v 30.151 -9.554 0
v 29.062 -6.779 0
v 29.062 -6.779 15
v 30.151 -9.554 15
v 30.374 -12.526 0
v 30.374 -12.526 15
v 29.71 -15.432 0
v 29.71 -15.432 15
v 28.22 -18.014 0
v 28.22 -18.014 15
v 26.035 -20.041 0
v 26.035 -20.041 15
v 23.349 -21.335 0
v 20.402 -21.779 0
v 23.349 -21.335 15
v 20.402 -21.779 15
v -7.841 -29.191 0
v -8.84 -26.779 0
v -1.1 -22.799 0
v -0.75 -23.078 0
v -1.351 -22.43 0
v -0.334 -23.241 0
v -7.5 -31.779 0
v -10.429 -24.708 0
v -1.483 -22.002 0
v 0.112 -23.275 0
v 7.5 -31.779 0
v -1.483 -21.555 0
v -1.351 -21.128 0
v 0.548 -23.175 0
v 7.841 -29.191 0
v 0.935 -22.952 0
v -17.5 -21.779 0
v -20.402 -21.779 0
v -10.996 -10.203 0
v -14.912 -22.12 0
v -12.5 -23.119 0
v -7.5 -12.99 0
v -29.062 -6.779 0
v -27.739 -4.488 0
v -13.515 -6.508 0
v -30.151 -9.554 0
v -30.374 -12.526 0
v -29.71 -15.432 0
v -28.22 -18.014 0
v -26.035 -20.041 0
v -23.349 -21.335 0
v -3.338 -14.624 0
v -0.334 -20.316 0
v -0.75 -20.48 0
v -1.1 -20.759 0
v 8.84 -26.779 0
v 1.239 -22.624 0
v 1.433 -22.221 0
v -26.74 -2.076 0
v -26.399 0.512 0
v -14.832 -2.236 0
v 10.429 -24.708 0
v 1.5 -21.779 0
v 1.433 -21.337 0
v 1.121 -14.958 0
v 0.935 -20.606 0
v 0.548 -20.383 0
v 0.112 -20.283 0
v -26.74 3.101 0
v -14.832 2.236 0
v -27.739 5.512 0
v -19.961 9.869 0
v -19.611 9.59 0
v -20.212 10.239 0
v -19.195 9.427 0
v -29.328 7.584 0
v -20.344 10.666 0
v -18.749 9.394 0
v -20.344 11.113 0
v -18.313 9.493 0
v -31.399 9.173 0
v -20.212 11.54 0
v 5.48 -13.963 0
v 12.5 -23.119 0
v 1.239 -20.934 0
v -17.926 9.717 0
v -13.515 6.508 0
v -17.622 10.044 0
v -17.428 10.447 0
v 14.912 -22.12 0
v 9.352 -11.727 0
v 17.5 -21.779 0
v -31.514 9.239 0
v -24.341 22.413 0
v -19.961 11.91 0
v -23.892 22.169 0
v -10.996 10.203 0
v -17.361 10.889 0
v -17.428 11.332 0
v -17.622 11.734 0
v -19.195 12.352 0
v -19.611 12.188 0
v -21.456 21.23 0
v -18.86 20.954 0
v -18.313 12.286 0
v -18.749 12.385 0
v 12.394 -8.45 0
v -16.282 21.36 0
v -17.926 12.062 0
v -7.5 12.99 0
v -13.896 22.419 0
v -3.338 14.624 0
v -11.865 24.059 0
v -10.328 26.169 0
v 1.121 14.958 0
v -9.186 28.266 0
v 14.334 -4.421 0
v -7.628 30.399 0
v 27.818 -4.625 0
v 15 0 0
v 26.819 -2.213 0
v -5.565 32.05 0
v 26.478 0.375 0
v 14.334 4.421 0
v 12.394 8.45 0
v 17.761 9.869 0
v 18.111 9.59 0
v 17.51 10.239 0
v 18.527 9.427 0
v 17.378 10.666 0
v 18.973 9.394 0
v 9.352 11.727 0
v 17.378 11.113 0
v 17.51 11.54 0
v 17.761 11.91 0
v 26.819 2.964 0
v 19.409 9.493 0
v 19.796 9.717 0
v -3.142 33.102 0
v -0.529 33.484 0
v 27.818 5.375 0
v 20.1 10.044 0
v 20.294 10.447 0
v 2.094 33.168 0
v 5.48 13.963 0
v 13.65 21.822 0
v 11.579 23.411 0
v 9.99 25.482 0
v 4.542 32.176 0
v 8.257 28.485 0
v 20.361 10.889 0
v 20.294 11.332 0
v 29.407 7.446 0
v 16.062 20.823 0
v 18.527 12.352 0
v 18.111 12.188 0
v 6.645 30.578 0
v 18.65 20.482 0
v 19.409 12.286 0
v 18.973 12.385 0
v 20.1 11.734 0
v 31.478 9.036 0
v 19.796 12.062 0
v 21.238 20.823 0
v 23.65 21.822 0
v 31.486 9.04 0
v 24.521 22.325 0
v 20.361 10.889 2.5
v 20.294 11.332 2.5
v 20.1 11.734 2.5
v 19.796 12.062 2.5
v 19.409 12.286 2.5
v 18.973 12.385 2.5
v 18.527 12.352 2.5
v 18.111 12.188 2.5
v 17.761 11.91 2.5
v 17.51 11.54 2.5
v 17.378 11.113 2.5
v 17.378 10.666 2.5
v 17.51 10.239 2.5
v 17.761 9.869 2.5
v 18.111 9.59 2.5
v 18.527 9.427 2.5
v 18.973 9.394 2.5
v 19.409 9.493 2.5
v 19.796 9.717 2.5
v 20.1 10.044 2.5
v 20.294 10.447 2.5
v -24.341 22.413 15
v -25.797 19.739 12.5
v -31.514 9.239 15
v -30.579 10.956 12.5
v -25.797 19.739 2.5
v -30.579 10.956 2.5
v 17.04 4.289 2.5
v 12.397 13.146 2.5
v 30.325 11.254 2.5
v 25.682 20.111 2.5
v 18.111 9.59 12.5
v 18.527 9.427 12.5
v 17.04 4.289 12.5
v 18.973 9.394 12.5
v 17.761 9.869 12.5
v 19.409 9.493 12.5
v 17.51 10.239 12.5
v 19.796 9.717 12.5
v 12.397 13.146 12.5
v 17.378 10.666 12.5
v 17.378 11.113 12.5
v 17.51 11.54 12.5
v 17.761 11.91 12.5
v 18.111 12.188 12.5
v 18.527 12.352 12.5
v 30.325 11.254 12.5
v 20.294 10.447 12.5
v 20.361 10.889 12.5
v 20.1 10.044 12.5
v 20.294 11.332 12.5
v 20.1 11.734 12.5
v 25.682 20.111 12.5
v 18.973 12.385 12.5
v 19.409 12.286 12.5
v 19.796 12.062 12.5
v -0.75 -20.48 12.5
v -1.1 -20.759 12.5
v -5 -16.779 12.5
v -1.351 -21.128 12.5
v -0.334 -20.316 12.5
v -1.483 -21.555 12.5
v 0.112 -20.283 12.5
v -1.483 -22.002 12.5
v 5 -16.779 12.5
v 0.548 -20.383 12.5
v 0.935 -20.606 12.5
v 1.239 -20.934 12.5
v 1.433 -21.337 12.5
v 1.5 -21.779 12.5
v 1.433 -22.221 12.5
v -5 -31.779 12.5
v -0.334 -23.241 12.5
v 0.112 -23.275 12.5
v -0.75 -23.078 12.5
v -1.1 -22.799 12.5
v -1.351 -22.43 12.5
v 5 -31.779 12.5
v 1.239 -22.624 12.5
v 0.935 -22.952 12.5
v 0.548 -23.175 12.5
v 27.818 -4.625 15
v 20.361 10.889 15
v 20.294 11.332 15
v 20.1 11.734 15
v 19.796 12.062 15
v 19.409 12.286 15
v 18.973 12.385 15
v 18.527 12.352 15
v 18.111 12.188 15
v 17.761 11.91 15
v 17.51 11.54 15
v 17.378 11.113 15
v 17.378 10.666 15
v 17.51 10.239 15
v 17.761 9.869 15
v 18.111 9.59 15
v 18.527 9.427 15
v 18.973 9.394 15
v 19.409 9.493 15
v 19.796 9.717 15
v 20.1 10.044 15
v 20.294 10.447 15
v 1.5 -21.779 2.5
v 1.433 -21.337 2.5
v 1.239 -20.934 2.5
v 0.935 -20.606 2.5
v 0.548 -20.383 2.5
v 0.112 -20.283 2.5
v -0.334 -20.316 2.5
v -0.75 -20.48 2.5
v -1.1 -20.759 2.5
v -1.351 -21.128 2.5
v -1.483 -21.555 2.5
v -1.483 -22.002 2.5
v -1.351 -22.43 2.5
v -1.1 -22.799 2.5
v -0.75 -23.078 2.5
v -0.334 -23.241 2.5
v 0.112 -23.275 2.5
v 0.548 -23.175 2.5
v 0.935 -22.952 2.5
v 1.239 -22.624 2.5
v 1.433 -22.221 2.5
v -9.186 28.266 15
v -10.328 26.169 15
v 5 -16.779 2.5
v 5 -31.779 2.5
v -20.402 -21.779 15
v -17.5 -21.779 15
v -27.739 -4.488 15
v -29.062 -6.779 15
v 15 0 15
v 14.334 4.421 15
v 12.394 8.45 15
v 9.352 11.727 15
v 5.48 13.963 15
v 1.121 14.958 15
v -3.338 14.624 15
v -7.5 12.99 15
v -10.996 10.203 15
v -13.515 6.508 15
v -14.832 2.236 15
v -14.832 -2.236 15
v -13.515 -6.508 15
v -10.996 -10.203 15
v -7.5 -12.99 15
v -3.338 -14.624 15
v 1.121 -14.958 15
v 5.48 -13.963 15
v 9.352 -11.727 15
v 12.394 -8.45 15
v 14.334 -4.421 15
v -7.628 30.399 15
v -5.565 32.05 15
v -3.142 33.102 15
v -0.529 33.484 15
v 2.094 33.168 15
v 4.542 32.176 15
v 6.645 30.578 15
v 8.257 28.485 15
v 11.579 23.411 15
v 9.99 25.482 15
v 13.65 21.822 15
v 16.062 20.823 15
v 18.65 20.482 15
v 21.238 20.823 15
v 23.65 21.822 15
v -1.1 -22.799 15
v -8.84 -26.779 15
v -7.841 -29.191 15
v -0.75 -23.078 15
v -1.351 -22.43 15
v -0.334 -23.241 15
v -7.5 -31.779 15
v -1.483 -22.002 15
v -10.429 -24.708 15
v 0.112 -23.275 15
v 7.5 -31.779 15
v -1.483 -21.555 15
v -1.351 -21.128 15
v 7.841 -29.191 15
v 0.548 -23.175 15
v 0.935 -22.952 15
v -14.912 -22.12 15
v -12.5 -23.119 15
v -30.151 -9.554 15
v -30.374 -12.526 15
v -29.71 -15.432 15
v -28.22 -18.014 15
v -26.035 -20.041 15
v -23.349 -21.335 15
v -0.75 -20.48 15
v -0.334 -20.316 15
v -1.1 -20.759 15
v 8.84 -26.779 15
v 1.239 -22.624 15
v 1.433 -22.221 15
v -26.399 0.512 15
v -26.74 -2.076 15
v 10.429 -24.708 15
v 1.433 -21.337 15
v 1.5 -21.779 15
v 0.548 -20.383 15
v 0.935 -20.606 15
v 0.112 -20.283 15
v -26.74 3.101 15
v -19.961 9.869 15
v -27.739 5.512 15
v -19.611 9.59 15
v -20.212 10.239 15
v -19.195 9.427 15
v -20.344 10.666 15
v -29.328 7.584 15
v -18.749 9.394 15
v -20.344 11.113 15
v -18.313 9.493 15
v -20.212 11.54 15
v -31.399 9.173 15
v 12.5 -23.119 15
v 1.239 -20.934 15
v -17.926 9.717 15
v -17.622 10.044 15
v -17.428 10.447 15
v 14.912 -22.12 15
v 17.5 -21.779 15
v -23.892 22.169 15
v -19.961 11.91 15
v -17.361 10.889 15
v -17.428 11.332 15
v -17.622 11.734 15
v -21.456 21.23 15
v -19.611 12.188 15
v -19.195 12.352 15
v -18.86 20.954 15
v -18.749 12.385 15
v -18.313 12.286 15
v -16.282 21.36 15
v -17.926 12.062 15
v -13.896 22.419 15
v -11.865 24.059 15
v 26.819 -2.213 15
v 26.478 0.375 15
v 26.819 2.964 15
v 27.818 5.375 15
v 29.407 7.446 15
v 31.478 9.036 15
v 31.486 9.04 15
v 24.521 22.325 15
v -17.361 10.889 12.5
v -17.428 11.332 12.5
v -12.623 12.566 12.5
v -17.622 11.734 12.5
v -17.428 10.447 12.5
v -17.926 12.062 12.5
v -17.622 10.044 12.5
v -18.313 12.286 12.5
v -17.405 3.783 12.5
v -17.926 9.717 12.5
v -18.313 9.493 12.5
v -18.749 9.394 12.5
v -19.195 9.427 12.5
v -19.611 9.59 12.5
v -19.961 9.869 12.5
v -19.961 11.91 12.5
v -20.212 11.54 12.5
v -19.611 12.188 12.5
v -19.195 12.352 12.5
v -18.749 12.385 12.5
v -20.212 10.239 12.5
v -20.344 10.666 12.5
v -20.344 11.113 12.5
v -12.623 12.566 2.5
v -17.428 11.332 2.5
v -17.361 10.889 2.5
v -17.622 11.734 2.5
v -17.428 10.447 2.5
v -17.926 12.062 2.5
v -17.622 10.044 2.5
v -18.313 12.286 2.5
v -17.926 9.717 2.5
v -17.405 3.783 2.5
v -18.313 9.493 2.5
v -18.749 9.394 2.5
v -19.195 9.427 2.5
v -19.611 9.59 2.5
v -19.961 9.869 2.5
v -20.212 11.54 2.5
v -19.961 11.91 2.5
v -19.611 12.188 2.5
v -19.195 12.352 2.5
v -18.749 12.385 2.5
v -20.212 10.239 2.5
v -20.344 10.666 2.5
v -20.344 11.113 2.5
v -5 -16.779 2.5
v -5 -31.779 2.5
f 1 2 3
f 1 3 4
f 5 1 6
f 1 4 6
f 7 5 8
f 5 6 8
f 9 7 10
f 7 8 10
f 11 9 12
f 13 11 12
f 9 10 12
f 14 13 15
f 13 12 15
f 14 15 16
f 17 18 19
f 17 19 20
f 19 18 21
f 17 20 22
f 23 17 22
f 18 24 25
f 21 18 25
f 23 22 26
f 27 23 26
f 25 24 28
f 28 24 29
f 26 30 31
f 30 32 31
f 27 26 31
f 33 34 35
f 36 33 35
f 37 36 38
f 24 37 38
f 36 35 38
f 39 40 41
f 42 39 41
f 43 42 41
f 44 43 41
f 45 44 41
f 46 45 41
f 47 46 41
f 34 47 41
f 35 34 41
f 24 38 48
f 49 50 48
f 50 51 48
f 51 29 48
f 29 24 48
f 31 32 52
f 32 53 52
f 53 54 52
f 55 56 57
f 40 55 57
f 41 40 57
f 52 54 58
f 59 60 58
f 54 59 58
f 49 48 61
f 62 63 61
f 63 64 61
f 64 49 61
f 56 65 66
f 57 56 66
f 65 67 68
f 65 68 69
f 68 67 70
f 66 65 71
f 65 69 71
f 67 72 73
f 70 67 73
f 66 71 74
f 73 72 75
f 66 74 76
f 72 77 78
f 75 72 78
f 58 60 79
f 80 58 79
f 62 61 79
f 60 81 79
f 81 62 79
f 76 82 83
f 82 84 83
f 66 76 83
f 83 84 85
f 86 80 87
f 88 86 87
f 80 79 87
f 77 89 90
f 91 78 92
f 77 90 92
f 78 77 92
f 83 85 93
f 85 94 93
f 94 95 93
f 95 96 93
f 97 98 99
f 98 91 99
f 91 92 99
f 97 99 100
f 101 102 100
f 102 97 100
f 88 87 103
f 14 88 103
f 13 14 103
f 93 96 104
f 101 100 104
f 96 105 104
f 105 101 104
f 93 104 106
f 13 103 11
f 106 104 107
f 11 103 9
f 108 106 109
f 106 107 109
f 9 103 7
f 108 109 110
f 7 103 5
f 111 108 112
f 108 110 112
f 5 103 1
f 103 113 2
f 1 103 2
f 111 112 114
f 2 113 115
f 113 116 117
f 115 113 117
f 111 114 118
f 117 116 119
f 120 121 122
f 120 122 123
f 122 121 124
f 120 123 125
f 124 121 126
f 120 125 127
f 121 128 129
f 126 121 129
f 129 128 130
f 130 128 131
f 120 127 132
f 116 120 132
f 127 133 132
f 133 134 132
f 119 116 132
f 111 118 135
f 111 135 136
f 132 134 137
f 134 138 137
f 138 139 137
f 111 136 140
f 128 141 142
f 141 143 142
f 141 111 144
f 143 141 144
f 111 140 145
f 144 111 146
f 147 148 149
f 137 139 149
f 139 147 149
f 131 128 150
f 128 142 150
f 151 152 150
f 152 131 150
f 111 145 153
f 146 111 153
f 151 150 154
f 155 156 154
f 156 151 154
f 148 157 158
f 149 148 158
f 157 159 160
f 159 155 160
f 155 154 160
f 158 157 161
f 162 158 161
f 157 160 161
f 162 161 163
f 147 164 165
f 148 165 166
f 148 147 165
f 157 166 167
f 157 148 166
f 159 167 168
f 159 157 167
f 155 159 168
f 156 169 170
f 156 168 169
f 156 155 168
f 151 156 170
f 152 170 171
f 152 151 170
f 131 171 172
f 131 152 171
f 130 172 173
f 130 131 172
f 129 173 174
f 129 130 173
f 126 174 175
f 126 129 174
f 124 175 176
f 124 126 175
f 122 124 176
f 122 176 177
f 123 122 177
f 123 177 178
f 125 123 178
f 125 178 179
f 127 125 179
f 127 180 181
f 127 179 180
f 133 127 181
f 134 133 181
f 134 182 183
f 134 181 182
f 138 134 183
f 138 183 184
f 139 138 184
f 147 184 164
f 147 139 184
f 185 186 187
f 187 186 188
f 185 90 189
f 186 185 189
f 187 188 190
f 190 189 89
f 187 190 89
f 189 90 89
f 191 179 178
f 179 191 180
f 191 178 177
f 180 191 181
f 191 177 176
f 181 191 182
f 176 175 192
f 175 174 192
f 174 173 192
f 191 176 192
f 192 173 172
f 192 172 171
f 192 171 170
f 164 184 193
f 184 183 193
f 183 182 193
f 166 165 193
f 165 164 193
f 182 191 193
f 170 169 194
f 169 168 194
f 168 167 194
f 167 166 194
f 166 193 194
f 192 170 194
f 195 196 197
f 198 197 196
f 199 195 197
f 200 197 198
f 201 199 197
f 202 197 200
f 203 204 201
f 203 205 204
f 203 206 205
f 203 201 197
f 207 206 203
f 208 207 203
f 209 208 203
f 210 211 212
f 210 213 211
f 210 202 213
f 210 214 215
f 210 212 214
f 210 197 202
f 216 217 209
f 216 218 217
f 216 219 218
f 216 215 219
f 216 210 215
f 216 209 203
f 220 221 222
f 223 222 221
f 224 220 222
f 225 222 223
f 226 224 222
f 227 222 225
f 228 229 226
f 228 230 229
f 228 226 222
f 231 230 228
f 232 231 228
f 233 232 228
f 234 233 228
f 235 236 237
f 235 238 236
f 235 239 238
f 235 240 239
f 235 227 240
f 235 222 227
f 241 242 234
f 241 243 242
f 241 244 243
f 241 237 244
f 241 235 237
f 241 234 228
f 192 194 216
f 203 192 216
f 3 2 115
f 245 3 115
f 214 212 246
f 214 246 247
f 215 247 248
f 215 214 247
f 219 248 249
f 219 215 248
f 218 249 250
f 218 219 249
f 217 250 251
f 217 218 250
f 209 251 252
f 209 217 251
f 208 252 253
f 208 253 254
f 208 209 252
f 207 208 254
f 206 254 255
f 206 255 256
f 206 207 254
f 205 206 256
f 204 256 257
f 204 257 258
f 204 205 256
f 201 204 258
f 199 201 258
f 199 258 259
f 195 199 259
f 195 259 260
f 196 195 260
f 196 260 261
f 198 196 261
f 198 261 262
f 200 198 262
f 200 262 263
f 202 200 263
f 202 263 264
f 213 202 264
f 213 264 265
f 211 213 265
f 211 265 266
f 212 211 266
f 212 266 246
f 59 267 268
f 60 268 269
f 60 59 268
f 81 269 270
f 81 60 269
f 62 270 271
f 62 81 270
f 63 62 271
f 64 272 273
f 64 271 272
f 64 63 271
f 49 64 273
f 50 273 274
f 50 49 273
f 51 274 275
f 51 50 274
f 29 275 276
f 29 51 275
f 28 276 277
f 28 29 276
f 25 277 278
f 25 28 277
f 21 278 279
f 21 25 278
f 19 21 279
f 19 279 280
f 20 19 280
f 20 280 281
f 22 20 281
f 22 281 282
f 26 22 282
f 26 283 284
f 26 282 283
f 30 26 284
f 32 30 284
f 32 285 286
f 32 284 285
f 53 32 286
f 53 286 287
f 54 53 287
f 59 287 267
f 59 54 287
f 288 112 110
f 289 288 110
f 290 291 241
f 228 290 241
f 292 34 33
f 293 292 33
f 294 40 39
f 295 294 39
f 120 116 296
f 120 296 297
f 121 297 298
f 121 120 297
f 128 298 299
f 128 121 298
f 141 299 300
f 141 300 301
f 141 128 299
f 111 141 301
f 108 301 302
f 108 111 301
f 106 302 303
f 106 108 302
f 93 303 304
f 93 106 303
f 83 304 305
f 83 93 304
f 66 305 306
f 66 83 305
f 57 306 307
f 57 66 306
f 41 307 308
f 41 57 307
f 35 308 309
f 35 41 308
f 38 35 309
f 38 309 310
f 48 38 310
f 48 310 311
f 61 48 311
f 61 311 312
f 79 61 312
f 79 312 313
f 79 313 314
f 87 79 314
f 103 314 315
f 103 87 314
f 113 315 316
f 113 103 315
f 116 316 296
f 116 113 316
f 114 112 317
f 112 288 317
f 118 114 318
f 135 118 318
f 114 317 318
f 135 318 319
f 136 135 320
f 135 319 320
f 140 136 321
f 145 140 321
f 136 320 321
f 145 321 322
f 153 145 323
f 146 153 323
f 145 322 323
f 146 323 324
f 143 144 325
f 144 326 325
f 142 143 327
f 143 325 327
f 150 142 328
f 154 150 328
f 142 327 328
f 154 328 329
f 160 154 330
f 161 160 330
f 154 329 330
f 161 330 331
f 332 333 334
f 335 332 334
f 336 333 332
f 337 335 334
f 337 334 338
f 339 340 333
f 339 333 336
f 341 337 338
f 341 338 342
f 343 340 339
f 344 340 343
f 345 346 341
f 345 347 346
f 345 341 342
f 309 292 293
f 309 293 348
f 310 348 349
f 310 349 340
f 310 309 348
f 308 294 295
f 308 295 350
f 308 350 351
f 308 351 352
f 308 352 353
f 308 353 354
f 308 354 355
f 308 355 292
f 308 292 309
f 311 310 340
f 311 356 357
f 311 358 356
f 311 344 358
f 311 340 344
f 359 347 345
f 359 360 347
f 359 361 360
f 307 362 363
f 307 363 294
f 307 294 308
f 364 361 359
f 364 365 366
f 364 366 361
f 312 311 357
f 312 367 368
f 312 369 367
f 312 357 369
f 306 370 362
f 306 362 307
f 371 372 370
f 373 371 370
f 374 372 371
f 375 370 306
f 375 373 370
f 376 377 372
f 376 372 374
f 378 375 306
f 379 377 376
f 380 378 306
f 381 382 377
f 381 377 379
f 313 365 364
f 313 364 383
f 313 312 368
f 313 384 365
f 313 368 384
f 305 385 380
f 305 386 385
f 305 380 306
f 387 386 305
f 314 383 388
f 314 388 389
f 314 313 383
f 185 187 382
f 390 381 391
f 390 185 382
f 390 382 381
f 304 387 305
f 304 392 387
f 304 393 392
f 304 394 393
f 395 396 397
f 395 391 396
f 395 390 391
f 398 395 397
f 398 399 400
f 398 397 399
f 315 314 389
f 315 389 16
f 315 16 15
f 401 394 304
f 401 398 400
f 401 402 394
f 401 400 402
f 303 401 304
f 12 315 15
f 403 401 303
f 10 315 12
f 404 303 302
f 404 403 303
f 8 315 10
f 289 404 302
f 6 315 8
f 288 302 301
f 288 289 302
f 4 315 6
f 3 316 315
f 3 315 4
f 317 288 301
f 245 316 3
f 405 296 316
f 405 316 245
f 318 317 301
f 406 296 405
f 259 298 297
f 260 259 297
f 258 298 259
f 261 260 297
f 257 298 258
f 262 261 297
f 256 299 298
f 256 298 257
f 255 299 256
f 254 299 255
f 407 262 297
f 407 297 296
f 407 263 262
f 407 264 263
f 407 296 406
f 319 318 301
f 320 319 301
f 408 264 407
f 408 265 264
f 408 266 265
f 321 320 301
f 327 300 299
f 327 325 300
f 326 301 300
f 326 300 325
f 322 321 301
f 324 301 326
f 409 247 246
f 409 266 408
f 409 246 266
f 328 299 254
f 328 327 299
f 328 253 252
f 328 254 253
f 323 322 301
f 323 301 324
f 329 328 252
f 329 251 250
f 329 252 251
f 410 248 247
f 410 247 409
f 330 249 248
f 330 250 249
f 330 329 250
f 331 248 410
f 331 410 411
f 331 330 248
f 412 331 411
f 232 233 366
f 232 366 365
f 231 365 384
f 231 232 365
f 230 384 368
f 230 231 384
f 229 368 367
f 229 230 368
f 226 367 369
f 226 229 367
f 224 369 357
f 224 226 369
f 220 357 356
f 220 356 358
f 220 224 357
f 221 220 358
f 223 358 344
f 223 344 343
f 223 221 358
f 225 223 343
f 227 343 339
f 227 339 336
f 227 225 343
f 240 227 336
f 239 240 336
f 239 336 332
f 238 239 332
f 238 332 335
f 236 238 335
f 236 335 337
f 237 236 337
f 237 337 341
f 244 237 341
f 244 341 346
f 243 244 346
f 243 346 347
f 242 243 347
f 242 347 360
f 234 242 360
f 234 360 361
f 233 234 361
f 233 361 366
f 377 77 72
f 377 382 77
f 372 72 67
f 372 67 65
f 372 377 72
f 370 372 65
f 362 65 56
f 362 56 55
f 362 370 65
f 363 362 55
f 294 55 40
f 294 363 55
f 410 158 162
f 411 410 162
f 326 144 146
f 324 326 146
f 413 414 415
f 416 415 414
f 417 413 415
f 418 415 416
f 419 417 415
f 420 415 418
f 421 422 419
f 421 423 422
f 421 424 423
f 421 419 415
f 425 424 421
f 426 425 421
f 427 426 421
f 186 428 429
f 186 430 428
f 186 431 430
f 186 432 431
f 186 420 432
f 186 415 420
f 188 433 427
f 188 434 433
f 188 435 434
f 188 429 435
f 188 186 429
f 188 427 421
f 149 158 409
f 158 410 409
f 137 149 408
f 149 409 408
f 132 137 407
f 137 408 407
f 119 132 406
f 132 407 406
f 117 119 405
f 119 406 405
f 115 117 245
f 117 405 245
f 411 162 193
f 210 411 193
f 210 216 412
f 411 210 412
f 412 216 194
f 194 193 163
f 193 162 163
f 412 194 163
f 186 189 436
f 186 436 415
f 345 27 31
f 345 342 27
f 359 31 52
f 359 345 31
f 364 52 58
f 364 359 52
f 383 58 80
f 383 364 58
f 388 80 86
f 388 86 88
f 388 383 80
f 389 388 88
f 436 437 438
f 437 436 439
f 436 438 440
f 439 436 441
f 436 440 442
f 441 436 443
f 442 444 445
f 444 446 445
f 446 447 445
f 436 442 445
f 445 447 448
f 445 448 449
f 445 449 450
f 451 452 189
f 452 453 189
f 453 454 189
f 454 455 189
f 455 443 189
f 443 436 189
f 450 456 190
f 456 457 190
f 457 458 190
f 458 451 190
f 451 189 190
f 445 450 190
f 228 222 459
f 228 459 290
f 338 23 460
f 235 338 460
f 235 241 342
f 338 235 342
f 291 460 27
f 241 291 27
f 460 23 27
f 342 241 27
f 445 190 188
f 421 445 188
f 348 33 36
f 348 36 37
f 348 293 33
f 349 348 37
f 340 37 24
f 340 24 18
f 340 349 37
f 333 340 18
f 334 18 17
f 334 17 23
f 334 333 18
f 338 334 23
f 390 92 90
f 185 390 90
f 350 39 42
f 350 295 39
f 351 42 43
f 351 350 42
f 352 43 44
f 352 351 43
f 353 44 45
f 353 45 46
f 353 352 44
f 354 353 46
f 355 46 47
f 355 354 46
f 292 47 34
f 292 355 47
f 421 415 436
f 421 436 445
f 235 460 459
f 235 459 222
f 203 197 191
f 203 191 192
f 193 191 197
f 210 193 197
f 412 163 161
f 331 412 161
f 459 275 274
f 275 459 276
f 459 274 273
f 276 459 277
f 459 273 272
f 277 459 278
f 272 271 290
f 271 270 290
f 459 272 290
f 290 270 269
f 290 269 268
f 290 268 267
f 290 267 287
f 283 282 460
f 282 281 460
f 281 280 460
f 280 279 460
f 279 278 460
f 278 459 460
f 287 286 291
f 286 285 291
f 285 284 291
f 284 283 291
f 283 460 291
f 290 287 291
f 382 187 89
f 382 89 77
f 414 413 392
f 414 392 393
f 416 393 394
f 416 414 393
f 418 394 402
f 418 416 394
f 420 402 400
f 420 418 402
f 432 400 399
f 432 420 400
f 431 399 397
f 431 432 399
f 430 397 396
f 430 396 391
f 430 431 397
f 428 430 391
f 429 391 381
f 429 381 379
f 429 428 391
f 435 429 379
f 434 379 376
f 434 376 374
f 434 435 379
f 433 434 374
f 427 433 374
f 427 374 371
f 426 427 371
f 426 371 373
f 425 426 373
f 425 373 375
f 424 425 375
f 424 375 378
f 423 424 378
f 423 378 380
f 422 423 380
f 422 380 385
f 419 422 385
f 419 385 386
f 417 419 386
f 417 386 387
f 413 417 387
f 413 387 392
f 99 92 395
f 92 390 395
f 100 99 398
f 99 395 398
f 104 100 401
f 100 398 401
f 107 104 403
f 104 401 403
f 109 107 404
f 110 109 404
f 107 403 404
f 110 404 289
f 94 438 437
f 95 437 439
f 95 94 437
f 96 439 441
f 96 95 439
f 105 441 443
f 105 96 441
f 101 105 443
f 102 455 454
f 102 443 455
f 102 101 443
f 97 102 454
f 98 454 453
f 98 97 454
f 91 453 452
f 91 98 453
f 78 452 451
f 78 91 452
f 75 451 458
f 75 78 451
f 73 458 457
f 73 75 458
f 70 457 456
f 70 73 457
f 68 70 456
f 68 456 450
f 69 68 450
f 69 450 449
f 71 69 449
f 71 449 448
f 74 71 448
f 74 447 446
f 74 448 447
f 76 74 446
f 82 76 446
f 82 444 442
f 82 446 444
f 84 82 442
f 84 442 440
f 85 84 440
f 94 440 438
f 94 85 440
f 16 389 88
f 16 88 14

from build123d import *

# Parameters (mm, degrees)
F0_R     = 1.5
F0_R_2   = 15
F1_DEPTH = 15
F2_W     = 10
F2_H     = 10
F3_DEPTH = 15
F4_W     = 10
F4_H     = 10
F5_DEPTH = 15
F6_W     = 10
F6_H     = 10
F7_DEPTH = 15
F8_R     = 9.99999


# Not quite as in the source:
# - a fillet or chamfer is up to 0.001 mm smaller than in the source, because OpenCascade refuses the exact size


with BuildPart() as f1:
    # F0 (on Top) → F1 (new body)
    with BuildSketch(Plane.XY):
        Polygon((-24.3407530135, 22.4126278684), (-31.5135795584, 9.2387689289), (-22.7389262459, 4.1727204769), (-37.7220713048, -21.7788480222), (-7.5, -21.7788480222), (-7.5, -31.7788480222), (0, -31.7788480222), (7.5, -31.7788480222), (7.5, -21.7788480222), (37.7220713048, -21.7788480222), (22.8180813967, 4.0356197342), (31.4860692862, 9.0400848755), (24.5212116355, 22.3250672958), (14.9900065464, 16.8222234719), (-0.6591394661, 43.9273394607), (-15.1098627306, 17.3866460996), align=None)
        with Locations((0, -21.7788480222)):
            Circle(F0_R, mode=Mode.SUBTRACT)
        Circle(F0_R_2, mode=Mode.SUBTRACT)
        with Locations((-18.8610356524, 10.8894240111)):
            Circle(F0_R, mode=Mode.SUBTRACT)
        with Locations((18.8610356524, 10.8894240111)):
            Circle(F0_R, mode=Mode.SUBTRACT)
    extrude(amount=F1_DEPTH)

    # F2 (on face) → F3 (cut)
    with BuildSketch(Plane.XZ.offset(31.7788480222)):
        with Locations((0, 7.5)):
            Rectangle(F2_W, F2_H)
    extrude(amount=-F3_DEPTH, mode=Mode.SUBTRACT)

    # F4 (on face) → F5 (cut)
    with BuildSketch(Plane(origin=(-28.1875812899, 15.3474112818, 0), x_dir=(-0.4781884363, -0.8782572626, 0), z_dir=(-0.8782572626, 0.4781884363, 0))):
        with Locations((0, 7.5)):
            Rectangle(F4_W, F4_H)
    extrude(amount=-F5_DEPTH, mode=Mode.SUBTRACT)

    # F6 (on face) → F7 (cut)
    with BuildSketch(Plane(origin=(28.415383594, 14.8972046453, 0), x_dir=(-0.4643238434, 0.8856654947, 0), z_dir=(0.8856654947, 0.4643238434, 0))):
        with Locations((0.8867585393, 7.5)):
            Rectangle(F6_W, F6_H)
    extrude(amount=-F7_DEPTH, mode=Mode.SUBTRACT)

    # F8 (radius 10 in the source; OpenCascade refuses exactly that, so slightly less here)
    f8_edges = [f1.edges().sort_by_distance(p)[0] for p in [
        (37.722071, -21.778848, 7.5),
        (-0.659139, 43.927339, 7.5),
        (14.990007, 16.822223, 7.5),
        (22.818081, 4.03562, 7.5),
        (7.5, -21.778848, 7.5),
        (-7.5, -21.778848, 7.5),
        (-37.722071, -21.778848, 7.5),
        (-22.738926, 4.17272, 7.5),
        (-15.109863, 17.386646, 7.5),
    ]]
    fillet(f8_edges, radius=F8_R)


solid = f1.part
